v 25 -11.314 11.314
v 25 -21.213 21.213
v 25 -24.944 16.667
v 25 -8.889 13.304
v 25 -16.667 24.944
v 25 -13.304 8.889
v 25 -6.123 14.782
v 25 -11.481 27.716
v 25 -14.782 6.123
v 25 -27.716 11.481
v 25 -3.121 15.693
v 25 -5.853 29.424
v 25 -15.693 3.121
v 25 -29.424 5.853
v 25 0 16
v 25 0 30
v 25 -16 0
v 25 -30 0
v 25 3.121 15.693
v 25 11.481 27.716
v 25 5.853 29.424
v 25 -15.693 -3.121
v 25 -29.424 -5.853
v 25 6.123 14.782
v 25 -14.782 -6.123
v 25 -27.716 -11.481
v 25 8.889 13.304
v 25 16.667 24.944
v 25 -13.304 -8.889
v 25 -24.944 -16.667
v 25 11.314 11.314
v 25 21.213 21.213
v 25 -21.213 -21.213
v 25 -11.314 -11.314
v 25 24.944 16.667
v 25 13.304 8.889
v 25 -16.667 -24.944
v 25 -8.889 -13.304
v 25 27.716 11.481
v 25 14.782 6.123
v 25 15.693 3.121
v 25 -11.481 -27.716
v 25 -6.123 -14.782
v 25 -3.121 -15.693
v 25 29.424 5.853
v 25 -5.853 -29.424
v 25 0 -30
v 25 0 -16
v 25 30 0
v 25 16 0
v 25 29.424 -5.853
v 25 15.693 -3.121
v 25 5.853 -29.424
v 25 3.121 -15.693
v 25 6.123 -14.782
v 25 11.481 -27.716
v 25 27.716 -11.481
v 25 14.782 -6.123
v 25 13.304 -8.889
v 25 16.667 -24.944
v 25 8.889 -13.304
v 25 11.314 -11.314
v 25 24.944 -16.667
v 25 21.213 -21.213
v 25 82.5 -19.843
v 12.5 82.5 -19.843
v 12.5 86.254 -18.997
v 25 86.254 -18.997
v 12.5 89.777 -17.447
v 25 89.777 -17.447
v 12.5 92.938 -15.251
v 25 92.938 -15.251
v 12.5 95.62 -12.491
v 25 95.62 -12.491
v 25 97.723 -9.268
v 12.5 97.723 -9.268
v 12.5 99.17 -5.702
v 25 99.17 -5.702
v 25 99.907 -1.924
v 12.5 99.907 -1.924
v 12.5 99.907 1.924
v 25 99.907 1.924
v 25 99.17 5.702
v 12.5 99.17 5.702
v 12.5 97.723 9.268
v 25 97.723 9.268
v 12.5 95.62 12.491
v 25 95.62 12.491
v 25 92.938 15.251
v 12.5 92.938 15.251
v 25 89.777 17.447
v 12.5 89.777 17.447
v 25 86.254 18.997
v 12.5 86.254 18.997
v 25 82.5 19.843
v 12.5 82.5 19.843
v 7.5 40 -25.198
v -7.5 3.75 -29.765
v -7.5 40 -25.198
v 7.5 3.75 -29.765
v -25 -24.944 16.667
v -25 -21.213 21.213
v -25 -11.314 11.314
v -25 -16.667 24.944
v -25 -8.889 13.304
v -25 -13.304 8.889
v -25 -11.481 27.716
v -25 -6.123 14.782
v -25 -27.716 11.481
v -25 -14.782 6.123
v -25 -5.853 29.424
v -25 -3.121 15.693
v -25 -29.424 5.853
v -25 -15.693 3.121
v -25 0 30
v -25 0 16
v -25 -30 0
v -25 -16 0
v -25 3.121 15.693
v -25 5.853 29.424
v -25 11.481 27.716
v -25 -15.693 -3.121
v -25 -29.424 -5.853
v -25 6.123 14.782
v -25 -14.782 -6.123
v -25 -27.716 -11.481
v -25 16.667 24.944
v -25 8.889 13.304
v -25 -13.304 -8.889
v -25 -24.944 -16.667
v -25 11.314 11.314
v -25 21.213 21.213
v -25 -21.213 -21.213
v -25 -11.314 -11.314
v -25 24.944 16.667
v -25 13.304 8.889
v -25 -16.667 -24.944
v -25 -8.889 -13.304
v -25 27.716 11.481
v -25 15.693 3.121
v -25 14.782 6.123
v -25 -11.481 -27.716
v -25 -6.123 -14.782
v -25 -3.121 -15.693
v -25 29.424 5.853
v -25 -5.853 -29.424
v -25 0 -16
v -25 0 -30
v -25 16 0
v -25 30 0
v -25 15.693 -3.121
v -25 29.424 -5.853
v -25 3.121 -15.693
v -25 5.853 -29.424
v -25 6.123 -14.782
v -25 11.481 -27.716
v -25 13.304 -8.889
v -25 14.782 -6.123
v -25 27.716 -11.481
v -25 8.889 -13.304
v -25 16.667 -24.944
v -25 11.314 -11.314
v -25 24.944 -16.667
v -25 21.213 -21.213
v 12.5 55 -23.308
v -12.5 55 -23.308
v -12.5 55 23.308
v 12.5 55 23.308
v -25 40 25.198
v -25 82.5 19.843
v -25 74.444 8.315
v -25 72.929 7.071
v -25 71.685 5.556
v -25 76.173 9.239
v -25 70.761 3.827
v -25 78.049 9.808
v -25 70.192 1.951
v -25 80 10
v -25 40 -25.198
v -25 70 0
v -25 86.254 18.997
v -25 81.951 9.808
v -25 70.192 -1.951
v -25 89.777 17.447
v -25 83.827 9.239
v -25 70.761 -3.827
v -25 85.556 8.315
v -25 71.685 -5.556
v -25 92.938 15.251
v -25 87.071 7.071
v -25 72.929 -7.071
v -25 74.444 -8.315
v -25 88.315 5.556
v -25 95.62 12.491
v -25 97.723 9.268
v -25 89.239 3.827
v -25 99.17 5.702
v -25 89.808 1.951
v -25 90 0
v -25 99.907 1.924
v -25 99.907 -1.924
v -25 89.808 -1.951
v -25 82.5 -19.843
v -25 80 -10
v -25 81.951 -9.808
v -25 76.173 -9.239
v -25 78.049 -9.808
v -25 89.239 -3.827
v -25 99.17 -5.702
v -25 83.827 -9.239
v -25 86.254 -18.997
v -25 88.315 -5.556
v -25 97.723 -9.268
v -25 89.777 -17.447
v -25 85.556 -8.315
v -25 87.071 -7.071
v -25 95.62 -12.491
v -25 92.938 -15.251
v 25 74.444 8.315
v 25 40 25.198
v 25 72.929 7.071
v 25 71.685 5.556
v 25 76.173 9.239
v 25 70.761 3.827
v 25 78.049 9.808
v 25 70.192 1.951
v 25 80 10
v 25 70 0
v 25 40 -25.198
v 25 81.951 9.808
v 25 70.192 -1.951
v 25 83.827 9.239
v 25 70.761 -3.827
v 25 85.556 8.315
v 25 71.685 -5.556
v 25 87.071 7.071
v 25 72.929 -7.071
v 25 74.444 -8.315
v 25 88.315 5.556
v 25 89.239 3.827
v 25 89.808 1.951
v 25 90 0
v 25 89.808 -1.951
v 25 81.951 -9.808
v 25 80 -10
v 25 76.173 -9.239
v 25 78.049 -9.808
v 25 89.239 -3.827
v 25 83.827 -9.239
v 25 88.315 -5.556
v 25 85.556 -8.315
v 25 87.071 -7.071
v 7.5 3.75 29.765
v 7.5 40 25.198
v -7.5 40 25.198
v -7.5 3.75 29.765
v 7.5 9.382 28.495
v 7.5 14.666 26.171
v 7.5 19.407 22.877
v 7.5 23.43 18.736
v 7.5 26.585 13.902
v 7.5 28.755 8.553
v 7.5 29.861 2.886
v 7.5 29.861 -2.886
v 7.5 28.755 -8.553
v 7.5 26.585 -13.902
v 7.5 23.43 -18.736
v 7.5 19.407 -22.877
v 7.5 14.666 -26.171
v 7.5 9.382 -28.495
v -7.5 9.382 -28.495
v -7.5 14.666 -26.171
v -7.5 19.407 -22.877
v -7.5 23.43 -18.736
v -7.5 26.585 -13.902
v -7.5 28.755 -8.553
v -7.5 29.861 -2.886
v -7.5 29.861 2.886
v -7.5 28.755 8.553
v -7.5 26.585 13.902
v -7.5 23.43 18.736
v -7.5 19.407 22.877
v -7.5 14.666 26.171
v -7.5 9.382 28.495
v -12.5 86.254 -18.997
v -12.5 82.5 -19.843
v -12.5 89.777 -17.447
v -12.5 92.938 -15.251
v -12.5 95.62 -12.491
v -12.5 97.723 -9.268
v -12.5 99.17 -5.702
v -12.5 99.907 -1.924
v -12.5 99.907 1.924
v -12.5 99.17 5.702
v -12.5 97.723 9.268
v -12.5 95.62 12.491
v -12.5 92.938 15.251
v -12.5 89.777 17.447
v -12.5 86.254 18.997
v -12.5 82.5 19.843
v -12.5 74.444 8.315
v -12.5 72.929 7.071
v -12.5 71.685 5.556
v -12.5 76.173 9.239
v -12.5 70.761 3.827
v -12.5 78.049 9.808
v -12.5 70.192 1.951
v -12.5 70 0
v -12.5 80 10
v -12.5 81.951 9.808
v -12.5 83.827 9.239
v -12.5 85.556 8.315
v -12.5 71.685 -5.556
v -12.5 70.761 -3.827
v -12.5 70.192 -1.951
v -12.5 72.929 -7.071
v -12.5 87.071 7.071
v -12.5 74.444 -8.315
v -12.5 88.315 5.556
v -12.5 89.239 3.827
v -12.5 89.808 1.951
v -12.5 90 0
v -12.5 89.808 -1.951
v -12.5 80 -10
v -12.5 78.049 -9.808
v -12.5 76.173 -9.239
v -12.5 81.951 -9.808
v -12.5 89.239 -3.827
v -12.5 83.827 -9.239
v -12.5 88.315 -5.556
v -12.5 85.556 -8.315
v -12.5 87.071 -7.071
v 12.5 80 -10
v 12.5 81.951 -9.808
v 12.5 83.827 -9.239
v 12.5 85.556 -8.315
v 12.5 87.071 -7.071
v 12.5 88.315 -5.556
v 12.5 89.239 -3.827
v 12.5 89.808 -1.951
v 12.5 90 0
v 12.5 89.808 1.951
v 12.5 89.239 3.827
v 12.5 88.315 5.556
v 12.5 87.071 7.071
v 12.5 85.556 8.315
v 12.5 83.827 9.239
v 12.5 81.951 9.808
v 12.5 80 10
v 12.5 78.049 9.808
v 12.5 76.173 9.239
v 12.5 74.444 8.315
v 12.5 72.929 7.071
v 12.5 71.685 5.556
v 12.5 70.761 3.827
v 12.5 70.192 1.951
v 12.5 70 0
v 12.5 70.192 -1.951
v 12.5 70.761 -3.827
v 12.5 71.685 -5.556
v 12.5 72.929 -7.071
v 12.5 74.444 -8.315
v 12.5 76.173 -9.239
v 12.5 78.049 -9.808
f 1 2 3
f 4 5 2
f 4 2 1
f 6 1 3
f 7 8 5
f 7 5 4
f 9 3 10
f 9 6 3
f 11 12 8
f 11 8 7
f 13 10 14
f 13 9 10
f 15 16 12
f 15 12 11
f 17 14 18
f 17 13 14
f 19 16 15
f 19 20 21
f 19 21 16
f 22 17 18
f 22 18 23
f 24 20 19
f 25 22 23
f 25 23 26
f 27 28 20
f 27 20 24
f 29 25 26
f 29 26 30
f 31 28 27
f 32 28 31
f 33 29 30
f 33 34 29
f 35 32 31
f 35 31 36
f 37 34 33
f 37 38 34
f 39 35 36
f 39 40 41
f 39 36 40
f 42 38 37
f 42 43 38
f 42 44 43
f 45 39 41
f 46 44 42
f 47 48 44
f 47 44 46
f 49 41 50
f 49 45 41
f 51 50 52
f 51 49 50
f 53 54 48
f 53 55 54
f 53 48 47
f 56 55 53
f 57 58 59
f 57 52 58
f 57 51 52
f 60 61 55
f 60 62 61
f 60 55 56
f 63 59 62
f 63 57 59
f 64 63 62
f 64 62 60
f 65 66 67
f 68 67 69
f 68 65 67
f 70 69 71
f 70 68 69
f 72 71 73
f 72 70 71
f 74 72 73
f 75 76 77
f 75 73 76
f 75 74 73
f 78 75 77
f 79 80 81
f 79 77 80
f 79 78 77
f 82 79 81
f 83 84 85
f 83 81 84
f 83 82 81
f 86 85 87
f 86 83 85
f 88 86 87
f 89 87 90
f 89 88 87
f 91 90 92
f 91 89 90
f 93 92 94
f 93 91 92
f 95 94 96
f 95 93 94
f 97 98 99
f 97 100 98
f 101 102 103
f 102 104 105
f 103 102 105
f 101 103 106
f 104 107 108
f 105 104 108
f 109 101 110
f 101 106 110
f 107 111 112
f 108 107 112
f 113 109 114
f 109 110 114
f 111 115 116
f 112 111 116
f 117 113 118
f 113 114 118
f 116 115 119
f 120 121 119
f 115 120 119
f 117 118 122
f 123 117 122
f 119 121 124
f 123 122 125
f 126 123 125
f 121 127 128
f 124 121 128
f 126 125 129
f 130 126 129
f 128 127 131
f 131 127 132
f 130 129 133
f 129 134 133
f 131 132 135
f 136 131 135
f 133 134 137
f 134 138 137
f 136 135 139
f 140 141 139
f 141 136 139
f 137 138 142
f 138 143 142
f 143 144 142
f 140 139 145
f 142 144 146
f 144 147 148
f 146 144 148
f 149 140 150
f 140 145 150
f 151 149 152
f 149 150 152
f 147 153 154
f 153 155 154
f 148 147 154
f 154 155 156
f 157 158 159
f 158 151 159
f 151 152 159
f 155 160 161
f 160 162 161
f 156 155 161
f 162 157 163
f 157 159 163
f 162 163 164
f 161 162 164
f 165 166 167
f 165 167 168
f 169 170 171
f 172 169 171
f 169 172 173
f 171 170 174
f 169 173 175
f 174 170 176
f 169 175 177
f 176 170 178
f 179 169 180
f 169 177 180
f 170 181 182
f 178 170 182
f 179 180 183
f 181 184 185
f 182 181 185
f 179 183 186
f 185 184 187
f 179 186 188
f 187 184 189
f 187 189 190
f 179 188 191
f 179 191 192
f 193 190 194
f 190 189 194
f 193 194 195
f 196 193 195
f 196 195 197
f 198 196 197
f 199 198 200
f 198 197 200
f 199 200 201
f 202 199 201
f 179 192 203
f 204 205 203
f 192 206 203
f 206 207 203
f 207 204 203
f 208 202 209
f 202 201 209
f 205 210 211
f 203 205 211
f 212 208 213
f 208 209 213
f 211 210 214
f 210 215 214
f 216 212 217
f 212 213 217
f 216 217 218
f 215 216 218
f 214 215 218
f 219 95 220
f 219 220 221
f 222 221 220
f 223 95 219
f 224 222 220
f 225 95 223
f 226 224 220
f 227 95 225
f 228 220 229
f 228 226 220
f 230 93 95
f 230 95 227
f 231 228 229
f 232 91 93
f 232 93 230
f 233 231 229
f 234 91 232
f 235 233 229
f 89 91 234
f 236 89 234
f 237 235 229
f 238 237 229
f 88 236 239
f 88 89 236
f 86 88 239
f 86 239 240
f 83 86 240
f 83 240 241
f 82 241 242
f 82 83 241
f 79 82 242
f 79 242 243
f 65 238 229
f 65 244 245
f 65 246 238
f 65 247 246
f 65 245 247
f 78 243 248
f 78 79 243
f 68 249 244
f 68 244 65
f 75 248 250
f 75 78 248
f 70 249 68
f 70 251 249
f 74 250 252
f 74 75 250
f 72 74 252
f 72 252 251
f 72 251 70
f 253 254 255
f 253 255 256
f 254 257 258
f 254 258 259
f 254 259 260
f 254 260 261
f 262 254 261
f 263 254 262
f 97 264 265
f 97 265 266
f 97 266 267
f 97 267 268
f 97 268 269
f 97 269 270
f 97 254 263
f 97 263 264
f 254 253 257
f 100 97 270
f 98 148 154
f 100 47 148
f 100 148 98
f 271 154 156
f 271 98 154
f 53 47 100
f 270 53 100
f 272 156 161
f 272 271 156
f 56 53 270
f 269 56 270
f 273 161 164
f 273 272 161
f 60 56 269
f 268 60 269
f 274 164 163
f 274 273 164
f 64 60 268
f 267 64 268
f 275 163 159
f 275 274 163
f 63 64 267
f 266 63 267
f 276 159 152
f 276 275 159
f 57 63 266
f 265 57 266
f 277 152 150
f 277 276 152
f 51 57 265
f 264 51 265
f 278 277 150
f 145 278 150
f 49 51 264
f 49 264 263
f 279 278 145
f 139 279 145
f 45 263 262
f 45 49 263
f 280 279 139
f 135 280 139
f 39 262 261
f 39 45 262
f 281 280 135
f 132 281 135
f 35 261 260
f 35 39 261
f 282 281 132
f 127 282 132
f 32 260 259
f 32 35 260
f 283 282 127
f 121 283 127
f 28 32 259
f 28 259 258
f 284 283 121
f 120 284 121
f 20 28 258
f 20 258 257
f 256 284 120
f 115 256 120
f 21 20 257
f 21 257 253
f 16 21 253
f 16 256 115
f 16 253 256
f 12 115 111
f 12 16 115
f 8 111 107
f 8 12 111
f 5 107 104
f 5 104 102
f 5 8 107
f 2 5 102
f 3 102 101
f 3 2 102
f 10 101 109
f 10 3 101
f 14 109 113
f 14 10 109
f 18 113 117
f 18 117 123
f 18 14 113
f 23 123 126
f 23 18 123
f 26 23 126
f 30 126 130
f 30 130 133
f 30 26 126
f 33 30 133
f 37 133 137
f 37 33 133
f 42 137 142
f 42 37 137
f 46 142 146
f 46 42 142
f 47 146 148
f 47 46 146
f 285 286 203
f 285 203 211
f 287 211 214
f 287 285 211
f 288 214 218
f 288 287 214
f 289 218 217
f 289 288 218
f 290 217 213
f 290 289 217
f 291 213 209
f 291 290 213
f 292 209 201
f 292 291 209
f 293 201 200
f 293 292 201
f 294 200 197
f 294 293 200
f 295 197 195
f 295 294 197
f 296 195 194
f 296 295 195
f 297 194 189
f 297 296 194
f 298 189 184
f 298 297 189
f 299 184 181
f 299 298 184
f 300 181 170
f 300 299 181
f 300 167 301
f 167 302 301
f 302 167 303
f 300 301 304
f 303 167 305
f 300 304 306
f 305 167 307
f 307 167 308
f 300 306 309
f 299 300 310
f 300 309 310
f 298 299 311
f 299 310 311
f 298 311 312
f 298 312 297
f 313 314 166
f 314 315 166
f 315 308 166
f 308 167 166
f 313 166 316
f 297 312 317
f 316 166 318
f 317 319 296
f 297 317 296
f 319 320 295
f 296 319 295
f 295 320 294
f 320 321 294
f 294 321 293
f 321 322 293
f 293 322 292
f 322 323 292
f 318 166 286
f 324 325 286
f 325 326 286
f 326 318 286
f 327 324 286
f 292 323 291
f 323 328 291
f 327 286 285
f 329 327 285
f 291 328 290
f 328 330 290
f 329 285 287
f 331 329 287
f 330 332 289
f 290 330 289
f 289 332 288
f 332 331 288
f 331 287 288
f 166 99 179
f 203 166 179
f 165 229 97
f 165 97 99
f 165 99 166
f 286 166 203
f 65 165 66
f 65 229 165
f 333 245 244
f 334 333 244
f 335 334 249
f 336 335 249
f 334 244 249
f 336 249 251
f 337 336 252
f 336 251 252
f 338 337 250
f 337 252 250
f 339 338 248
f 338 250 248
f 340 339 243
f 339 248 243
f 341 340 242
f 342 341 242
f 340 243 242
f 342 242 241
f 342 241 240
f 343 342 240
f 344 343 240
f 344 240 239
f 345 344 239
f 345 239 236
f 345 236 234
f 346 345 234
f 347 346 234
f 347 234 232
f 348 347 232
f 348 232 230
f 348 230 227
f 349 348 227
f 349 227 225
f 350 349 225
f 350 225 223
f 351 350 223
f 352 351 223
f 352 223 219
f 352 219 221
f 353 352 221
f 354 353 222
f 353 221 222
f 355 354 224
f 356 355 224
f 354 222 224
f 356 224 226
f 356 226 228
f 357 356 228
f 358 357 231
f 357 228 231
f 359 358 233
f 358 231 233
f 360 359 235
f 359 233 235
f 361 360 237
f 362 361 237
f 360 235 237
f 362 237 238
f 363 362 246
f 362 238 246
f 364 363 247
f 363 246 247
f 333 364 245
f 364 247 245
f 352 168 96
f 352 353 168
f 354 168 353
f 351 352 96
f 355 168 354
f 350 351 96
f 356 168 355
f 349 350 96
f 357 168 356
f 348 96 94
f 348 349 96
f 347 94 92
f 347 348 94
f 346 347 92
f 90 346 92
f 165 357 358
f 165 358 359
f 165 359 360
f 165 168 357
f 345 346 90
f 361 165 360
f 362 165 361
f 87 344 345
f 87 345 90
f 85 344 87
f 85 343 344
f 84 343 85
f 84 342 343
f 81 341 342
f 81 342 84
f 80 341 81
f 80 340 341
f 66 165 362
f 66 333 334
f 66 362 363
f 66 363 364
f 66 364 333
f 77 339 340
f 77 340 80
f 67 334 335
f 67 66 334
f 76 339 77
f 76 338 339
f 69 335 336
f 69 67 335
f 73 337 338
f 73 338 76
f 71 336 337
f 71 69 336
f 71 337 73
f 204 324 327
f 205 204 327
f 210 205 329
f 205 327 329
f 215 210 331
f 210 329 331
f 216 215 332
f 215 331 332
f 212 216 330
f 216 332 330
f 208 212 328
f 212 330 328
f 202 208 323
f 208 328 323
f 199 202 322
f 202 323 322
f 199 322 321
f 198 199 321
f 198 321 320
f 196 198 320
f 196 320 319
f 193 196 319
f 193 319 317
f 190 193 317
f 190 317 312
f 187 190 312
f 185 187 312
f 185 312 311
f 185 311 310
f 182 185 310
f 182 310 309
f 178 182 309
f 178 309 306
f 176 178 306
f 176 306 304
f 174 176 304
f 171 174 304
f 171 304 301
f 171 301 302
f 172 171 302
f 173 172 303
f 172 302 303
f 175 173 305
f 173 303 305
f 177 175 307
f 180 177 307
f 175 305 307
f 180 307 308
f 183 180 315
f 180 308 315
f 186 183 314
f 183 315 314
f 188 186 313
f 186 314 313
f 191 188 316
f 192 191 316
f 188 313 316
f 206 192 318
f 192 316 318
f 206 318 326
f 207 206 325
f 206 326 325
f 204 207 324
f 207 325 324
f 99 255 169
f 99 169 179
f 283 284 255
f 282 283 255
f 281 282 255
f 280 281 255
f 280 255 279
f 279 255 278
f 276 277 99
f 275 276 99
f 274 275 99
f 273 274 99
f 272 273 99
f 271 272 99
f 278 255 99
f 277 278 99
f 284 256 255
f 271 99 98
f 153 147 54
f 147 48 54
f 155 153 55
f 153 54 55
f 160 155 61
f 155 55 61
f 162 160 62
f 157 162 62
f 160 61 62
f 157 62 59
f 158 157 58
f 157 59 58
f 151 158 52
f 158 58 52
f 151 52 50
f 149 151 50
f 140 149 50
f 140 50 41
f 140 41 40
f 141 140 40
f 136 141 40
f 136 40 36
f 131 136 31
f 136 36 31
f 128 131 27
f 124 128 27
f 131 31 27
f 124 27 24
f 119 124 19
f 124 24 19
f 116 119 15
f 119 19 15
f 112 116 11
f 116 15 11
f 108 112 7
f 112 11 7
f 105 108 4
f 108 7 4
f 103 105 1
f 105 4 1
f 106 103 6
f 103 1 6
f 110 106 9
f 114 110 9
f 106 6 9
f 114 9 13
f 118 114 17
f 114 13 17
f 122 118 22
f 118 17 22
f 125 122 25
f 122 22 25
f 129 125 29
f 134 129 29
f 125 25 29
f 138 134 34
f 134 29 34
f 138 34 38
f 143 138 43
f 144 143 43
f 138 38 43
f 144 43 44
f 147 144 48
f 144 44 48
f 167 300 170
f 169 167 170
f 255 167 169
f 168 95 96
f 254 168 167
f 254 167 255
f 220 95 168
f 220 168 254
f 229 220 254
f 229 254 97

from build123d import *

# Parameters (mm, degrees)
SKETCH1_R               = 30
BOSS_EXTRUDE1_DEPTH     = 25
SKETCH2_R               = 16
CUT_EXTRUDE1_DEPTH      = 25
BOSS_EXTRUDE3_DEPTH     = 25
BOSS_EXTRUDE4_DEPTH     = 7.5
SKETCH4_R               = 10
CUT_EXTRUDE2_DEPTH      = 51
SKETCH5_W               = 25
SKETCH5_H               = 45
CUT_EXTRUDE3_DEPTH      = 31
CUT_EXTRUDE3_DEPTH_BACK = 31


with BuildPart() as part:
    # Sketch1 → Boss-Extrude1 (new body, symmetric)
    with BuildSketch(Plane(origin=(0, 0, 0), x_dir=(0, 0, -1), z_dir=(1, 0, 0))):
        Circle(SKETCH1_R)
    extrude(amount=BOSS_EXTRUDE1_DEPTH, both=True)

    # Sketch2 → Cut-Extrude1 (cut, symmetric)
    with BuildSketch(Plane(origin=(0, 0, 0), x_dir=(0, 0, -1), z_dir=(1, 0, 0))):
        Circle(SKETCH2_R)
    extrude(amount=CUT_EXTRUDE1_DEPTH, both=True, mode=Mode.SUBTRACT)



with BuildPart() as body_2:
    # Sketch3 → Boss-Extrude3 (new body, symmetric)
    with BuildSketch(Plane(origin=(0, 0, 0), x_dir=(0, 0, -1), z_dir=(1, 0, 0))):
        with BuildLine():
            Line((-19.843134833, 82.5), (-25.197631534, 40))
            Line((-25.197631534, 40), (25.197631534, 40))
            Line((25.197631534, 40), (19.843134833, 82.5))
            ThreePointArc((19.843134833, 82.5), (0, 100), (-19.843134833, 82.5))
        make_face()
    extrude(amount=BOSS_EXTRUDE3_DEPTH, both=True)


with BuildPart() as part_1:
    add(part.part)

    add(body_2.part)  # Boss-Extrude4 merges body 2
    # Sketch3<3> → Boss-Extrude4 (add, symmetric)
    with BuildSketch(Plane(origin=(0, 0, 0), x_dir=(0, 0, -1), z_dir=(1, 0, 0))):
        with BuildLine():
            Line((25.197631534, 40), (-25.197631534, 40))
            Line((-25.197631534, 40), (-29.764702249, 3.75))
            ThreePointArc((-29.764702249, 3.75), (0, 30), (29.764702249, 3.75))
            Line((29.764702249, 3.75), (25.197631534, 40))
        make_face()
    extrude(amount=BOSS_EXTRUDE4_DEPTH, both=True)

    # Sketch4 → Cut-Extrude2 (cut, through all)
    with BuildSketch(Plane(origin=(25, 0, 0), x_dir=(0, 0, -1), z_dir=(1, 0, 0))):
        with Locations((0, 80)):
            Circle(SKETCH4_R)
    extrude(amount=-CUT_EXTRUDE2_DEPTH, mode=Mode.SUBTRACT)

    # Sketch5 → Cut-Extrude3 (cut, two sides)
    with BuildSketch(Plane.XY) as cut_extrude3_sk:
        with Locations((0, 77.5)):
            Rectangle(SKETCH5_W, SKETCH5_H)
    extrude(amount=CUT_EXTRUDE3_DEPTH, mode=Mode.SUBTRACT)
    extrude(cut_extrude3_sk.sketch, amount=-CUT_EXTRUDE3_DEPTH_BACK, mode=Mode.SUBTRACT)


solid = part_1.part
